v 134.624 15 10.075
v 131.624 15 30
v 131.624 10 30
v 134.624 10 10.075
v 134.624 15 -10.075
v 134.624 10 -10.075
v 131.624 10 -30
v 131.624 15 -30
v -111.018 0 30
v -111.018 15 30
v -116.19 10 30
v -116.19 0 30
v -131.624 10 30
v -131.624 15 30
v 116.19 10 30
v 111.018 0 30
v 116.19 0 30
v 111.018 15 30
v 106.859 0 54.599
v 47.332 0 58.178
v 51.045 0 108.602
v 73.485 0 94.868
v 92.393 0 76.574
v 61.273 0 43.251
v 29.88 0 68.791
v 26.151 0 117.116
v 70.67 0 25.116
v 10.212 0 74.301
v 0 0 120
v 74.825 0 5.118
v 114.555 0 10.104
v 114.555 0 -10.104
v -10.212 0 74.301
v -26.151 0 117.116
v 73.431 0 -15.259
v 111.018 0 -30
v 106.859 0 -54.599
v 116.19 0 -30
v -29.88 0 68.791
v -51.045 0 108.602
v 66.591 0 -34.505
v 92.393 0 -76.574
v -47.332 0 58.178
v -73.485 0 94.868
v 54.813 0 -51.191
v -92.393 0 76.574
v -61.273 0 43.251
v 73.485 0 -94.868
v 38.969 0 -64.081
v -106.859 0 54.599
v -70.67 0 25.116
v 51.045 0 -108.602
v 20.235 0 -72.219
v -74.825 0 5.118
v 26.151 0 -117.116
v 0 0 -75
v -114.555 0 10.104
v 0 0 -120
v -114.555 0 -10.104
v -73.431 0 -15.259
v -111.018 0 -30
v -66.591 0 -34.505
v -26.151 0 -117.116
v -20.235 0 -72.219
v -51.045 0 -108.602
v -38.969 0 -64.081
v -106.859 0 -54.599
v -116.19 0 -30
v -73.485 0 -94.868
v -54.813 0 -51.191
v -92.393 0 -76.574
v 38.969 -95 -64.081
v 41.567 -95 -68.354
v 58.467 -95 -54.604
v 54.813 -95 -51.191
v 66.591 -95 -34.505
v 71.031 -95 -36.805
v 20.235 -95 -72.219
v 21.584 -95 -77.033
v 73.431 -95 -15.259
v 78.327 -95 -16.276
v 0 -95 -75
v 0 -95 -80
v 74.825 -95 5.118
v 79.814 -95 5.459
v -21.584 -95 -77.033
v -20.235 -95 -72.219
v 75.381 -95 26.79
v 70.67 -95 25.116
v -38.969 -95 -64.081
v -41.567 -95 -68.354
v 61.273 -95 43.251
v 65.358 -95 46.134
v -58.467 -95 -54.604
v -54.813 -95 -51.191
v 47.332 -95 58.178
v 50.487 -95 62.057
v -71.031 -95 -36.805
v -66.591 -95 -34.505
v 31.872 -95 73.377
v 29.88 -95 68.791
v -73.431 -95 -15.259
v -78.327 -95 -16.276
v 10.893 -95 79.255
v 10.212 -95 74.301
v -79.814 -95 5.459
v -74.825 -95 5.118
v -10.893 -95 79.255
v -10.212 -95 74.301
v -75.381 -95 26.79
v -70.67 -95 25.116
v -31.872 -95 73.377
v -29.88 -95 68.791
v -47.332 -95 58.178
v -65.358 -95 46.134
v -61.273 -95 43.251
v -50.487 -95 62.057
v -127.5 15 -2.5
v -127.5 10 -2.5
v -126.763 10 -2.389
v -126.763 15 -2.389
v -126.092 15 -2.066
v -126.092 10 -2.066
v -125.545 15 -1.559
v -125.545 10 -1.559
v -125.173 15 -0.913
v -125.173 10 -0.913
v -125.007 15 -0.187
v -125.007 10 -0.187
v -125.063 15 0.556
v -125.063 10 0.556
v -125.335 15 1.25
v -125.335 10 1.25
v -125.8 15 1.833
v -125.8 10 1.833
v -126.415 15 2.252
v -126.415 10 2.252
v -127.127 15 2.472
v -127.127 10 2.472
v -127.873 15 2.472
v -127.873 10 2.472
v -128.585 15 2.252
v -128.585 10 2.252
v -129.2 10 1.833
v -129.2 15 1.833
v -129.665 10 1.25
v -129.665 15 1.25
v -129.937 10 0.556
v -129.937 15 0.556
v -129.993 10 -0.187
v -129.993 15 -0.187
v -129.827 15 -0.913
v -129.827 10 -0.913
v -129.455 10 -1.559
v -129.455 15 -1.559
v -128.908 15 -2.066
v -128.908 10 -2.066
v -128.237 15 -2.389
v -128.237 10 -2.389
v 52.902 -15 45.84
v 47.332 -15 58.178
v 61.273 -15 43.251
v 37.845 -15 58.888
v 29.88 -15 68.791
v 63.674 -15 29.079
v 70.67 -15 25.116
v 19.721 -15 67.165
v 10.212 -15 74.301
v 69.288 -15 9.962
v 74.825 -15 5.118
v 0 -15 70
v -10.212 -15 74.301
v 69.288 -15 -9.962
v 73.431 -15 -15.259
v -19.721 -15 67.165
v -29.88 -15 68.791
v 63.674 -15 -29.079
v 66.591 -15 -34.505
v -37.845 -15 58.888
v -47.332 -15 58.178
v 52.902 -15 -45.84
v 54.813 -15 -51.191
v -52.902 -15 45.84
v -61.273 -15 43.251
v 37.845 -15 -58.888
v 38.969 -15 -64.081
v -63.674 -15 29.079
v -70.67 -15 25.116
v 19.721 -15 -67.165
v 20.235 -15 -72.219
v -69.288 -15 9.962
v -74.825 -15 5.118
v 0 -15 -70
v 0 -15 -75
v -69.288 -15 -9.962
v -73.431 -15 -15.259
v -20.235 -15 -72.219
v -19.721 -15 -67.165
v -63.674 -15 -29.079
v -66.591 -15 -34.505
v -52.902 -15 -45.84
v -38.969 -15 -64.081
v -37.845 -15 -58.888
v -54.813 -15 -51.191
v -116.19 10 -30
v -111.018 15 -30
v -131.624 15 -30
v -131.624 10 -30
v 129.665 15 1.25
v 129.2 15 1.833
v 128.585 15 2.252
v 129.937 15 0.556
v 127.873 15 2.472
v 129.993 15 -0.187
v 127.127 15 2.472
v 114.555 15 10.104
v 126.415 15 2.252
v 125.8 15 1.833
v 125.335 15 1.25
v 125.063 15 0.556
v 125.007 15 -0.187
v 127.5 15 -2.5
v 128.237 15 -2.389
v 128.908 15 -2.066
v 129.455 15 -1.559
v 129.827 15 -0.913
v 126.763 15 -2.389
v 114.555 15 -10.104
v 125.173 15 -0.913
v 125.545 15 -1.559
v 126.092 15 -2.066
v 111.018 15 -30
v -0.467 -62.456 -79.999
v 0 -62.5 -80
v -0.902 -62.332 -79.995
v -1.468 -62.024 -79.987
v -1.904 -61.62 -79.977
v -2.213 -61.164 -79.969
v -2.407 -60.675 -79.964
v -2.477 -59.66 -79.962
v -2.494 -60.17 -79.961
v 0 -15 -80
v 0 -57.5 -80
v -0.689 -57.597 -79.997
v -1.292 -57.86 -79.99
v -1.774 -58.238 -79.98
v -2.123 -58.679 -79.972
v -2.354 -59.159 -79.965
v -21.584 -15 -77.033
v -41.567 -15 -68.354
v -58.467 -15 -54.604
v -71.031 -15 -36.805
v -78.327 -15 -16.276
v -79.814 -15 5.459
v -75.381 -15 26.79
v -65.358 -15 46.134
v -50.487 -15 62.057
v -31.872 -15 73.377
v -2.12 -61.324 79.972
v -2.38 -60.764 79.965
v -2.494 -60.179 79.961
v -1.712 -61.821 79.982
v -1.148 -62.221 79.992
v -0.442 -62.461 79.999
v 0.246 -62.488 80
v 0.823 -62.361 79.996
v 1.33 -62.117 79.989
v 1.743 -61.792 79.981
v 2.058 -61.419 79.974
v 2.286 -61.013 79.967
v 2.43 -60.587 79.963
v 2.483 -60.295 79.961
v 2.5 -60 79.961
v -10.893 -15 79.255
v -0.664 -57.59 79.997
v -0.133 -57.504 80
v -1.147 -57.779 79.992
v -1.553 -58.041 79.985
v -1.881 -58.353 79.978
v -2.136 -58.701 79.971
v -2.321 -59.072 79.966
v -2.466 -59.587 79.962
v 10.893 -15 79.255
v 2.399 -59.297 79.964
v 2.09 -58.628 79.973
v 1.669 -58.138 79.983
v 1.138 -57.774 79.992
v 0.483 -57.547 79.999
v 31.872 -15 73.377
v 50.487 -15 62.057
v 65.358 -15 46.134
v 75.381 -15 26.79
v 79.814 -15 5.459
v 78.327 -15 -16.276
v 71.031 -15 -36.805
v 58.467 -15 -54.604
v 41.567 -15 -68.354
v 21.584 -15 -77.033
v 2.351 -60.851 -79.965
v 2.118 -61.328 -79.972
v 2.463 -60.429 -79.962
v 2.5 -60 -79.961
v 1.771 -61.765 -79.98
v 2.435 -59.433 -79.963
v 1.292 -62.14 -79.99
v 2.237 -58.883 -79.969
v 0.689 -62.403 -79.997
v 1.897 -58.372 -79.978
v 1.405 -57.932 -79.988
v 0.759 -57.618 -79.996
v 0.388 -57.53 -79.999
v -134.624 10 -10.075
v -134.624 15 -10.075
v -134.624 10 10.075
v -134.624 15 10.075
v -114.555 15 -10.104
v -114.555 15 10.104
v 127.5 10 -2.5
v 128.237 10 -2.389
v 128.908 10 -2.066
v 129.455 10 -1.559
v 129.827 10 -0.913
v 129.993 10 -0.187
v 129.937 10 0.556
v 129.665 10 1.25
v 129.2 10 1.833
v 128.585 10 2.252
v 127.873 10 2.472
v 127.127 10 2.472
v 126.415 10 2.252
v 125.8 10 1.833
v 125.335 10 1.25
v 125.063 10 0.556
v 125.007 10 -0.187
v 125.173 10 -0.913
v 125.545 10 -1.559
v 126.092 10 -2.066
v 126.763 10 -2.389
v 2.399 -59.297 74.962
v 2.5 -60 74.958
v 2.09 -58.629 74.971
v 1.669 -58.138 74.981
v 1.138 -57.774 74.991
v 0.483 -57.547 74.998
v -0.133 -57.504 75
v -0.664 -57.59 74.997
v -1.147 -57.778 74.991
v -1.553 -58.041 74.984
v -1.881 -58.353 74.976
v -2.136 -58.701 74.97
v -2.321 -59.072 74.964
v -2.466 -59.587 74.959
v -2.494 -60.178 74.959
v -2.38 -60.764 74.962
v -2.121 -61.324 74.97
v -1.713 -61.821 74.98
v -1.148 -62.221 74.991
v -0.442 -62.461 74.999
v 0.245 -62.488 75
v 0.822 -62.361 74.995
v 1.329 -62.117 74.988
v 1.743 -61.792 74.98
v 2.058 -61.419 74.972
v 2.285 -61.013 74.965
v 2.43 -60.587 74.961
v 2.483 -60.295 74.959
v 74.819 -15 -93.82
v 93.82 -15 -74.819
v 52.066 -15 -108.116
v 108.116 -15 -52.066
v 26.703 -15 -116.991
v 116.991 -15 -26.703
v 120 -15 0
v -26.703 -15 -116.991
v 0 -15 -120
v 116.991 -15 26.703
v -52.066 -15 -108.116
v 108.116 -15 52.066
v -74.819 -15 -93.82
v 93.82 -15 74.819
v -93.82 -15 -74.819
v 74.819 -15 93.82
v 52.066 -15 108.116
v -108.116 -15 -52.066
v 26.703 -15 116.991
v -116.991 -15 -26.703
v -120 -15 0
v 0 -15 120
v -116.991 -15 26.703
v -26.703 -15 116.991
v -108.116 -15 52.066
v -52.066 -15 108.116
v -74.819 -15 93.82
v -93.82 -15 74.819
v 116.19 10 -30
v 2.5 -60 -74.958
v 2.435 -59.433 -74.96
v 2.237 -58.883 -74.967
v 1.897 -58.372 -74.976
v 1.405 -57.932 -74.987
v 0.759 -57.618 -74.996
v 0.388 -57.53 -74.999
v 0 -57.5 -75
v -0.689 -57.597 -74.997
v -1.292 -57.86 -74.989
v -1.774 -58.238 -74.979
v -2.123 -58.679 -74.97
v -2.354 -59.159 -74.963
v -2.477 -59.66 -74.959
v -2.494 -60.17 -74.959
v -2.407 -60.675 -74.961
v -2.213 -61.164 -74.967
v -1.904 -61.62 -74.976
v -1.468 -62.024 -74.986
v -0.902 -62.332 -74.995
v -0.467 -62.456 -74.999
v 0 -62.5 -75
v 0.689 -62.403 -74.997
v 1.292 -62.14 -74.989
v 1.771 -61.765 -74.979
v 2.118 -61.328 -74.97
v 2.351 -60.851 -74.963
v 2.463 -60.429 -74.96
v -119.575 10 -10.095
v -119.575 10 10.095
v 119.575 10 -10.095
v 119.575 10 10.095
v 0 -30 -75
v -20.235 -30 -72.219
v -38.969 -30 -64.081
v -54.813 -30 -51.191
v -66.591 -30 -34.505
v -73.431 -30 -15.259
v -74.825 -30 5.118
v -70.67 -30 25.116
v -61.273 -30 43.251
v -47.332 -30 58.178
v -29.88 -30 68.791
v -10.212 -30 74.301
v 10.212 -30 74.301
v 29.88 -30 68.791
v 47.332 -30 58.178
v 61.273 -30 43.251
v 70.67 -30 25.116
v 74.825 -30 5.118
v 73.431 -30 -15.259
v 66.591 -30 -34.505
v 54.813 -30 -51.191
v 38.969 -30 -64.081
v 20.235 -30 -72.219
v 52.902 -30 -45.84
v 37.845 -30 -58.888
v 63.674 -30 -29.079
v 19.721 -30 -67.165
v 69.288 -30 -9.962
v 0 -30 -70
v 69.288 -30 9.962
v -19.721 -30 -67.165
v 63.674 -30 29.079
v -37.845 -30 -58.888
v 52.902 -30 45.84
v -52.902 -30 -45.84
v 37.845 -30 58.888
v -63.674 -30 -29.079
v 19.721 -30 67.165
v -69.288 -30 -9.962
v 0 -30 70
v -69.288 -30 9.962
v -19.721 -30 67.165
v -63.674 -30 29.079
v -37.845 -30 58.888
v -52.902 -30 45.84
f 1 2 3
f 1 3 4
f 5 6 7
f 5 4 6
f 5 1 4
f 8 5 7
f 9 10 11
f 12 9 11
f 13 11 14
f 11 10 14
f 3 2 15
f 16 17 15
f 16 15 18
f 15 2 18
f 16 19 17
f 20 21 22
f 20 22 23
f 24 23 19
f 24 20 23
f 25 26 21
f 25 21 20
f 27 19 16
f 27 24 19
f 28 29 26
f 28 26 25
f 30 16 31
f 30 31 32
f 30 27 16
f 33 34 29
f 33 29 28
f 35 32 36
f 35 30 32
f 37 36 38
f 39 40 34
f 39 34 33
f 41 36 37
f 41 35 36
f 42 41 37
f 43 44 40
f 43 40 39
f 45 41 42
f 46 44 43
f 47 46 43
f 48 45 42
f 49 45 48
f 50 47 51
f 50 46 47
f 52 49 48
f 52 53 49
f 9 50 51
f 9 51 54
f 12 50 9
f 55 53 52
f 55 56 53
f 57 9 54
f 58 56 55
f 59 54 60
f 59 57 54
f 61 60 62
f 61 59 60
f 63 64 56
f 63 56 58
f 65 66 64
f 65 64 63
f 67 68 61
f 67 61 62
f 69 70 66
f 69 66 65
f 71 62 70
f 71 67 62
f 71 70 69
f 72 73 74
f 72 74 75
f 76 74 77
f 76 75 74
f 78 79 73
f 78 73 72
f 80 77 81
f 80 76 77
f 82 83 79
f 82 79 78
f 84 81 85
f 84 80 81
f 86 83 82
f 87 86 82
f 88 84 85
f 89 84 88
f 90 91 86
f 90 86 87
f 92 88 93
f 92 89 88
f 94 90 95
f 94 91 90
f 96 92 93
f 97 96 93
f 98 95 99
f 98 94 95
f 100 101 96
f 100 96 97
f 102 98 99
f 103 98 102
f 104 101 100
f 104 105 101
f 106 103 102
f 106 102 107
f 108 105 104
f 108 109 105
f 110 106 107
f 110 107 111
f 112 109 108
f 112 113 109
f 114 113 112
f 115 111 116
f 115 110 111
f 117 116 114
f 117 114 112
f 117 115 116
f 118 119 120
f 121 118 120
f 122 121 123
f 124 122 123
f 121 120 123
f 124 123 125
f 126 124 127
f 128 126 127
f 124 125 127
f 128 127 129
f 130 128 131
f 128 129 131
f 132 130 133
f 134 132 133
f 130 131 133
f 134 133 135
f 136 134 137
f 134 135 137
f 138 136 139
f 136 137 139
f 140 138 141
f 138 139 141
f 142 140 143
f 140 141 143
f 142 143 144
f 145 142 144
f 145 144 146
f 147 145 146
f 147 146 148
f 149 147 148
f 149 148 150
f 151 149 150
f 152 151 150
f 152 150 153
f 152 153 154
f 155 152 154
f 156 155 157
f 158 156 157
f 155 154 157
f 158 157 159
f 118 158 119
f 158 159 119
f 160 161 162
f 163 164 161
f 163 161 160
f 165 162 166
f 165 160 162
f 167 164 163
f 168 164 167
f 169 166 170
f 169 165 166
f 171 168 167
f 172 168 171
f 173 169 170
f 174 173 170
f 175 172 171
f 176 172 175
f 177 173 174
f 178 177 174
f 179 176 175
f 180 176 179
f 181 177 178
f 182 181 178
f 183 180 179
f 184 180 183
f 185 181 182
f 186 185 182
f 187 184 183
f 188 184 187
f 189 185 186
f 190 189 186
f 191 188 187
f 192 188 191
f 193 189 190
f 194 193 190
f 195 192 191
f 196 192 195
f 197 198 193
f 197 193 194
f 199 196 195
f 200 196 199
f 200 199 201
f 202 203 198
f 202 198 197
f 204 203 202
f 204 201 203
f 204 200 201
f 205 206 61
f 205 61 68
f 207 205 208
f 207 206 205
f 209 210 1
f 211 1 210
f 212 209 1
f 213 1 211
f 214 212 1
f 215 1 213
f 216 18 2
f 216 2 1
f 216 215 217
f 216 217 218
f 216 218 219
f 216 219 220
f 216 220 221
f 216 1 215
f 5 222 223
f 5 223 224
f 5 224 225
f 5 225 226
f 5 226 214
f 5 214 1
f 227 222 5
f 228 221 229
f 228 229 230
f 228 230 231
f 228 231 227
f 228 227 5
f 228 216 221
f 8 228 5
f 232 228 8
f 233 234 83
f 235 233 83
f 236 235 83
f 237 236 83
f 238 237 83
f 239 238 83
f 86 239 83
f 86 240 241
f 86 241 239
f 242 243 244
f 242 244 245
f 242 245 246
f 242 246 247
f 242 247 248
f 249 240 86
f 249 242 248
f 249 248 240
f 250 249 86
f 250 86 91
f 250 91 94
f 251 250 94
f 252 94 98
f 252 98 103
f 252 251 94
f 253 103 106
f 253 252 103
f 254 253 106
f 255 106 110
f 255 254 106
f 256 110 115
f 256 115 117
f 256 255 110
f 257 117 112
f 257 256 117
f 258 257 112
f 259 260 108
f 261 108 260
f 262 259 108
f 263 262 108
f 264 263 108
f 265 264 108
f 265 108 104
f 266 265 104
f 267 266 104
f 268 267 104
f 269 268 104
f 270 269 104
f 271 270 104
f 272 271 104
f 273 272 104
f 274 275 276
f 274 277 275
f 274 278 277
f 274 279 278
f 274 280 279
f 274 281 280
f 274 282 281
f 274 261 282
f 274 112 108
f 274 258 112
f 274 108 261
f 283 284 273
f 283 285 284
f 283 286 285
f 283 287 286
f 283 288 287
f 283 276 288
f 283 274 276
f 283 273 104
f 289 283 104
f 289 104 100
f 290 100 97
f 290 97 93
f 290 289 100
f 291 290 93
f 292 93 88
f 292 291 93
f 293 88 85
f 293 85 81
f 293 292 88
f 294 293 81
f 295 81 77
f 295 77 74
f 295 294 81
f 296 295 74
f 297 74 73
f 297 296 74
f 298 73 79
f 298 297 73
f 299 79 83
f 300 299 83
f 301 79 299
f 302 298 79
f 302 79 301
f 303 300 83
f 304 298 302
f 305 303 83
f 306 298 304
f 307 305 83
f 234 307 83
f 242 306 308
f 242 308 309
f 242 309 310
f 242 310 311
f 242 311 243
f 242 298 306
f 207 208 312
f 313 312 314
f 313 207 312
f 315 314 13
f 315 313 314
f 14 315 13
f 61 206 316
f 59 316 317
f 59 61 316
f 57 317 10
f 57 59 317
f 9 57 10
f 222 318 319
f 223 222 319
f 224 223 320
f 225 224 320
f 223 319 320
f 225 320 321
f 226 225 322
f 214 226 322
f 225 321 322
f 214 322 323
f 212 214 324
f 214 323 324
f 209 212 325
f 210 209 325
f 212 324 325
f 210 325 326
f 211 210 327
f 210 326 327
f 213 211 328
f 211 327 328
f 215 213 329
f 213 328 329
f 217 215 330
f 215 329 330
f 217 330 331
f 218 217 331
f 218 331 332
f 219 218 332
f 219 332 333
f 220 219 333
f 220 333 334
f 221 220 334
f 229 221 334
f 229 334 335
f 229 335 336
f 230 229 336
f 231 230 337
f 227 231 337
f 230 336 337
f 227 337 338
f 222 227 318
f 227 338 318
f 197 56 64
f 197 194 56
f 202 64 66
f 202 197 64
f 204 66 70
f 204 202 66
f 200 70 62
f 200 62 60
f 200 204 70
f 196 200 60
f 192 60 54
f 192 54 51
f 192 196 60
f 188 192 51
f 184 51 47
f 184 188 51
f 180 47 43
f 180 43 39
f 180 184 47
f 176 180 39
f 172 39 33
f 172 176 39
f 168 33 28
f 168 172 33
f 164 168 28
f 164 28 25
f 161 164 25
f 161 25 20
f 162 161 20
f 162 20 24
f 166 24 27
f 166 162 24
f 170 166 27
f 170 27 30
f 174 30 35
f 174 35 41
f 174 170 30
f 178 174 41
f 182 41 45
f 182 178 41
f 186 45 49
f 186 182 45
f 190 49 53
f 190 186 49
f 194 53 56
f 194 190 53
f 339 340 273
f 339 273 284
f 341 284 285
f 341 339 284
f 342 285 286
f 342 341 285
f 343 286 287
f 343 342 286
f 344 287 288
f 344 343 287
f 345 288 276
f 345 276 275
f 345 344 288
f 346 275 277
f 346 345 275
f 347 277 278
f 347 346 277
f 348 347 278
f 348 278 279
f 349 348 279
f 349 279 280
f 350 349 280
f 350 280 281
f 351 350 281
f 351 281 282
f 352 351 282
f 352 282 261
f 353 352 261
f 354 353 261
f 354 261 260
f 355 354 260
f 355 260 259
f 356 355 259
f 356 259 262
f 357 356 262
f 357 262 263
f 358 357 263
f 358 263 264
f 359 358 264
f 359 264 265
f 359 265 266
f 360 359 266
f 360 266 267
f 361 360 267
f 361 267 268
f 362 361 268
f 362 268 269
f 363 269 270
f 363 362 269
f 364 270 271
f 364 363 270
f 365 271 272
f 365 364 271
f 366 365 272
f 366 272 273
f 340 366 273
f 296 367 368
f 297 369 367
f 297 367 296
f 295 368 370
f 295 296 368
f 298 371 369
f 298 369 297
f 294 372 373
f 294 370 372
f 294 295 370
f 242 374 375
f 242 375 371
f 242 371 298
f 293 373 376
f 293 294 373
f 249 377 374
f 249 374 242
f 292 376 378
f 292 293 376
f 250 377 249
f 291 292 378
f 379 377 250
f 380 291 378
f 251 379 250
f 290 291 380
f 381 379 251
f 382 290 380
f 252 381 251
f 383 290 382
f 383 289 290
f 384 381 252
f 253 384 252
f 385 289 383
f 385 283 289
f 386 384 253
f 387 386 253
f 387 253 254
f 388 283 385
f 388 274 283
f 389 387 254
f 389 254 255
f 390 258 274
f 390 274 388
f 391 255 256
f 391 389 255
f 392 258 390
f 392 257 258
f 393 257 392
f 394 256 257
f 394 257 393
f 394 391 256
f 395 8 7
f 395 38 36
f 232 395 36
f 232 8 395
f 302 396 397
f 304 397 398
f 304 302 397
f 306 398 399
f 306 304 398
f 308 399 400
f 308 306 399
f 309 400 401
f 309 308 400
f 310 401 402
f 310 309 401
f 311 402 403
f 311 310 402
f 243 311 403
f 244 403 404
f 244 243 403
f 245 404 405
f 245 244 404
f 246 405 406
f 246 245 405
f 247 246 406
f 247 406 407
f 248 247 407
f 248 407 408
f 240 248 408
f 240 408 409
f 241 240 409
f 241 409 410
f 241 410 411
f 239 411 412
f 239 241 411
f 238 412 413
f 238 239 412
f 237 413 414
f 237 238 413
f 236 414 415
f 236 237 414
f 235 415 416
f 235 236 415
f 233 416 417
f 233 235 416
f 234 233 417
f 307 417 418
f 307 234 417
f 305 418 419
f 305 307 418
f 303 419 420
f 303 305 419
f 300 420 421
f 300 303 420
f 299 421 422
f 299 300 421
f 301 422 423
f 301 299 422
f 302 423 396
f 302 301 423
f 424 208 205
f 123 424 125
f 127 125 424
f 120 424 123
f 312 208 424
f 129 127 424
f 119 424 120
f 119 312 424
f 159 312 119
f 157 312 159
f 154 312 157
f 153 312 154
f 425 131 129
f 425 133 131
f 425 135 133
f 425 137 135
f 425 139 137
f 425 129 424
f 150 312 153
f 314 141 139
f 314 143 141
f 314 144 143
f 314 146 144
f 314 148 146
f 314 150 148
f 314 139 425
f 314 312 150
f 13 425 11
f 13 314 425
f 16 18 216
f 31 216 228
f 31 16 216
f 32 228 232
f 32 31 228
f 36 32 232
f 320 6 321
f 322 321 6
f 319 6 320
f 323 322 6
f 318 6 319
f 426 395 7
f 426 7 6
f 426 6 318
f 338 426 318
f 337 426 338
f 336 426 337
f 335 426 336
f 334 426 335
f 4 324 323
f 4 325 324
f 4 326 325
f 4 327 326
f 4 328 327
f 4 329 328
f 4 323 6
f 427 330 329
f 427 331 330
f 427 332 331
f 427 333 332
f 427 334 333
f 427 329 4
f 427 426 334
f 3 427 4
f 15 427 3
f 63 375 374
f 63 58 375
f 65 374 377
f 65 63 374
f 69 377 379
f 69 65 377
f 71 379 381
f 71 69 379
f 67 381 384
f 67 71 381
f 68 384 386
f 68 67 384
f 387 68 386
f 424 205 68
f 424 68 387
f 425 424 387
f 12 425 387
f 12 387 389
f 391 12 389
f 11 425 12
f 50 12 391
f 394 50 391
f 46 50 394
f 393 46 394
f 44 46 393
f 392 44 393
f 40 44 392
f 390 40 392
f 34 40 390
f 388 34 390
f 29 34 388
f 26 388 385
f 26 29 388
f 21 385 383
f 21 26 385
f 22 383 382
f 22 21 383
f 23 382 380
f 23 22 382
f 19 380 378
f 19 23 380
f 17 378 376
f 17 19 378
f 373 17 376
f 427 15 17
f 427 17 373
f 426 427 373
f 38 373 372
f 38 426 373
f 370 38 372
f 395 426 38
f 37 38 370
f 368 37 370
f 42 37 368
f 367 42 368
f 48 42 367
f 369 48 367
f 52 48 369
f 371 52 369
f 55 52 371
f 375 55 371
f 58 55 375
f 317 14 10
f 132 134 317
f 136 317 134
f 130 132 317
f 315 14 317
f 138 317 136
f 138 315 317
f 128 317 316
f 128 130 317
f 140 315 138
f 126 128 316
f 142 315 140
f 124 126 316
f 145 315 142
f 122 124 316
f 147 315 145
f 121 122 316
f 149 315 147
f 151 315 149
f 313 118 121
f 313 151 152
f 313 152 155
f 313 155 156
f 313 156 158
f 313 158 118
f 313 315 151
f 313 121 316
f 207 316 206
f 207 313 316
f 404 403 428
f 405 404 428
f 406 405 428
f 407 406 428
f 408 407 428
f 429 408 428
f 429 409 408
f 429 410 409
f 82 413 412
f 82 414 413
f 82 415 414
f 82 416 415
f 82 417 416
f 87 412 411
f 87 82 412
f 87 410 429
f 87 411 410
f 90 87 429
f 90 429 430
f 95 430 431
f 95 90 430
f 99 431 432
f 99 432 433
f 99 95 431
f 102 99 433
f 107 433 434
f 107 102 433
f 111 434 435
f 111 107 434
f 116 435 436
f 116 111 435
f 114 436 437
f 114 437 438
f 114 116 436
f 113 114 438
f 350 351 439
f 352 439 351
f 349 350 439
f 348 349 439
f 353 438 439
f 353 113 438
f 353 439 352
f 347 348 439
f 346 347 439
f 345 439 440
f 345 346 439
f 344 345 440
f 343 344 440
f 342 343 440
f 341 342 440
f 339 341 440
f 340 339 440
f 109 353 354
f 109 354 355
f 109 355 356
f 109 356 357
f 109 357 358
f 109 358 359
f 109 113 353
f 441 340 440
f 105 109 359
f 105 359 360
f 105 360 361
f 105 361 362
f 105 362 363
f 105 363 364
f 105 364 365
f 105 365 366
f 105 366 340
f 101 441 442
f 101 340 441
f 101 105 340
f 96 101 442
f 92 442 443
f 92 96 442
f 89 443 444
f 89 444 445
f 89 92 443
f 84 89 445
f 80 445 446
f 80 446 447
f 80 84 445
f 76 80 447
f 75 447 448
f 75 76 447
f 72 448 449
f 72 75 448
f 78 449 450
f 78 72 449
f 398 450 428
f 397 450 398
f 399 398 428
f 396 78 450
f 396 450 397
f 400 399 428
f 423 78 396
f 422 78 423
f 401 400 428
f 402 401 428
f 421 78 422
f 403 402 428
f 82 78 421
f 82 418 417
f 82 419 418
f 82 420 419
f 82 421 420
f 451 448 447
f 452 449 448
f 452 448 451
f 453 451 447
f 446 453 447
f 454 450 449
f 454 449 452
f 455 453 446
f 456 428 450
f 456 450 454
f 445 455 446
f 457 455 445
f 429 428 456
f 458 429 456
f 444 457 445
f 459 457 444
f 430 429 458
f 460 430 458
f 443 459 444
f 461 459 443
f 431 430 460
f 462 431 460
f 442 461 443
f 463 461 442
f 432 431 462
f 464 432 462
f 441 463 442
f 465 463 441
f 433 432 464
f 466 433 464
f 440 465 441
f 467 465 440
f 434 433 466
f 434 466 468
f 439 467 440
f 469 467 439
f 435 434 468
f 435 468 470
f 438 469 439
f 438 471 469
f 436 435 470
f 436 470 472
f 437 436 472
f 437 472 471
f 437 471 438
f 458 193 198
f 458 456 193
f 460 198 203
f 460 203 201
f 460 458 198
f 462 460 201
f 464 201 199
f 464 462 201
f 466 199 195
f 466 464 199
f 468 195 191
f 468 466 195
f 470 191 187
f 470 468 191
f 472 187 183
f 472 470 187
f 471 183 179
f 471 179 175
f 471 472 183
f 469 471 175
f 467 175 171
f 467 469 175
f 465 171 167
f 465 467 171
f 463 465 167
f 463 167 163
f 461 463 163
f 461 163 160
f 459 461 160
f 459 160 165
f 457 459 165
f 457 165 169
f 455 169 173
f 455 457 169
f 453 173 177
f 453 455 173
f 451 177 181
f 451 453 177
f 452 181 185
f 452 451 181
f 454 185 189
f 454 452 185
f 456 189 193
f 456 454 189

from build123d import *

# Parameters (mm, degrees)
SKETCH2_R               = 2.5
CUT_EXTRUDE3_DEPTH      = 5
CUT_EXTRUDE4_REACH      = 222.341
CUT_EXTRUDE6_DEPTH      = 205.08331632
CUT_EXTRUDE6_DEPTH_BACK = 205.08331632
SKETCH6_R               = 2.5


with BuildPart() as part:
    # Sketch1 → Revolve1 (revolve)
    with BuildSketch(Plane.XY, mode=Mode.PRIVATE) as revolve1_sk:
        Polygon((-80, -95), (-80, -15), (-120, -15), (-120, 10), (-135, 10), (-135, 15), (-115, 15), (-115, 0), (-75, 0), (-75, -15), (-70, -15), (-70, -30), (-75, -30), (-75, -95), align=None)
    revolve(revolve1_sk.sketch.rotate(Axis((0, -100.5, 0), (0, 1, 0)), 270), axis=Axis((0, -100.5, 0), (0, 1, 0)))

    # Sketch2 → Cut-Extrude3 (cut)
    with BuildSketch(Plane.XZ.offset(-10)):
        with Locations(Location((127.5, 0, 0), (0, 0, 270))):
            Circle(SKETCH2_R)
        with Locations(Location((-127.5, 0, 0), (0, 0, 270))):
            Circle(SKETCH2_R)
    extrude(amount=-CUT_EXTRUDE3_DEPTH, mode=Mode.SUBTRACT)

    # Cut-Extrude4: up to this face of the body (flat: up to its plane)
    cut_extrude4_end = Plane(part.part.faces().sort_by_distance((0, 0, 111.747308807))[0])
    # Sketch3 → Cut-Extrude4 (cut, up to the picked face)
    with BuildSketch(Plane(origin=(0, 15, 0), x_dir=(1, 0, 0), z_dir=(0, 1, 0)), mode=Mode.PRIVATE) as cut_extrude4_sk1:
        with BuildLine():
            Line((-111.018016556, -30), (-131.624465811, -30))
            ThreePointArc((-131.624465811, -30), (0, -135), (131.624465811, -30))
            Line((131.624465811, -30), (111.018016556, -30))
            ThreePointArc((111.018016556, -30), (0, -115), (-111.018016556, -30))
        make_face()
    cut_extrude4_tool1 = split(extrude(cut_extrude4_sk1.sketch, amount=-CUT_EXTRUDE4_REACH, mode=Mode.PRIVATE), bisect_by=cut_extrude4_end, keep=Keep.BOTH, mode=Mode.PRIVATE)
    # Sketch3 → Cut-Extrude4 (cut, up to the picked face)
    with BuildSketch(Plane(origin=(0, 15, 0), x_dir=(1, 0, 0), z_dir=(0, 1, 0)), mode=Mode.PRIVATE) as cut_extrude4_sk2:
        with BuildLine():
            Line((131.624465811, 30), (111.018016556, 30))
            ThreePointArc((111.018016556, 30), (0, 115), (-111.018016556, 30))
            Line((-111.018016556, 30), (-131.624465811, 30))
            ThreePointArc((-131.624465811, 30), (0, 135), (131.624465811, 30))
        make_face()
    cut_extrude4_tool2 = split(extrude(cut_extrude4_sk2.sketch, amount=-CUT_EXTRUDE4_REACH, mode=Mode.PRIVATE), bisect_by=cut_extrude4_end, keep=Keep.BOTH, mode=Mode.PRIVATE)
    add(cut_extrude4_tool1.solids().sort_by(Axis((-121.321241, 15, 32.834167), (0, -1, 0)))[0], mode=Mode.SUBTRACT)
    add(cut_extrude4_tool2.solids().sort_by(Axis((-121.321241, 15, -32.834167), (0, -1, 0)))[0], mode=Mode.SUBTRACT)

    # Sketch6 → Cut-Extrude6 (cut, two sides: drawn at the far end of the back side and taken through both)
    with BuildSketch(Plane.XY.offset(-CUT_EXTRUDE6_DEPTH_BACK)):
        with Locations((0, -60)):
            Circle(SKETCH6_R)
    extrude(amount=CUT_EXTRUDE6_DEPTH + CUT_EXTRUDE6_DEPTH_BACK, mode=Mode.SUBTRACT)


solid = part.part
